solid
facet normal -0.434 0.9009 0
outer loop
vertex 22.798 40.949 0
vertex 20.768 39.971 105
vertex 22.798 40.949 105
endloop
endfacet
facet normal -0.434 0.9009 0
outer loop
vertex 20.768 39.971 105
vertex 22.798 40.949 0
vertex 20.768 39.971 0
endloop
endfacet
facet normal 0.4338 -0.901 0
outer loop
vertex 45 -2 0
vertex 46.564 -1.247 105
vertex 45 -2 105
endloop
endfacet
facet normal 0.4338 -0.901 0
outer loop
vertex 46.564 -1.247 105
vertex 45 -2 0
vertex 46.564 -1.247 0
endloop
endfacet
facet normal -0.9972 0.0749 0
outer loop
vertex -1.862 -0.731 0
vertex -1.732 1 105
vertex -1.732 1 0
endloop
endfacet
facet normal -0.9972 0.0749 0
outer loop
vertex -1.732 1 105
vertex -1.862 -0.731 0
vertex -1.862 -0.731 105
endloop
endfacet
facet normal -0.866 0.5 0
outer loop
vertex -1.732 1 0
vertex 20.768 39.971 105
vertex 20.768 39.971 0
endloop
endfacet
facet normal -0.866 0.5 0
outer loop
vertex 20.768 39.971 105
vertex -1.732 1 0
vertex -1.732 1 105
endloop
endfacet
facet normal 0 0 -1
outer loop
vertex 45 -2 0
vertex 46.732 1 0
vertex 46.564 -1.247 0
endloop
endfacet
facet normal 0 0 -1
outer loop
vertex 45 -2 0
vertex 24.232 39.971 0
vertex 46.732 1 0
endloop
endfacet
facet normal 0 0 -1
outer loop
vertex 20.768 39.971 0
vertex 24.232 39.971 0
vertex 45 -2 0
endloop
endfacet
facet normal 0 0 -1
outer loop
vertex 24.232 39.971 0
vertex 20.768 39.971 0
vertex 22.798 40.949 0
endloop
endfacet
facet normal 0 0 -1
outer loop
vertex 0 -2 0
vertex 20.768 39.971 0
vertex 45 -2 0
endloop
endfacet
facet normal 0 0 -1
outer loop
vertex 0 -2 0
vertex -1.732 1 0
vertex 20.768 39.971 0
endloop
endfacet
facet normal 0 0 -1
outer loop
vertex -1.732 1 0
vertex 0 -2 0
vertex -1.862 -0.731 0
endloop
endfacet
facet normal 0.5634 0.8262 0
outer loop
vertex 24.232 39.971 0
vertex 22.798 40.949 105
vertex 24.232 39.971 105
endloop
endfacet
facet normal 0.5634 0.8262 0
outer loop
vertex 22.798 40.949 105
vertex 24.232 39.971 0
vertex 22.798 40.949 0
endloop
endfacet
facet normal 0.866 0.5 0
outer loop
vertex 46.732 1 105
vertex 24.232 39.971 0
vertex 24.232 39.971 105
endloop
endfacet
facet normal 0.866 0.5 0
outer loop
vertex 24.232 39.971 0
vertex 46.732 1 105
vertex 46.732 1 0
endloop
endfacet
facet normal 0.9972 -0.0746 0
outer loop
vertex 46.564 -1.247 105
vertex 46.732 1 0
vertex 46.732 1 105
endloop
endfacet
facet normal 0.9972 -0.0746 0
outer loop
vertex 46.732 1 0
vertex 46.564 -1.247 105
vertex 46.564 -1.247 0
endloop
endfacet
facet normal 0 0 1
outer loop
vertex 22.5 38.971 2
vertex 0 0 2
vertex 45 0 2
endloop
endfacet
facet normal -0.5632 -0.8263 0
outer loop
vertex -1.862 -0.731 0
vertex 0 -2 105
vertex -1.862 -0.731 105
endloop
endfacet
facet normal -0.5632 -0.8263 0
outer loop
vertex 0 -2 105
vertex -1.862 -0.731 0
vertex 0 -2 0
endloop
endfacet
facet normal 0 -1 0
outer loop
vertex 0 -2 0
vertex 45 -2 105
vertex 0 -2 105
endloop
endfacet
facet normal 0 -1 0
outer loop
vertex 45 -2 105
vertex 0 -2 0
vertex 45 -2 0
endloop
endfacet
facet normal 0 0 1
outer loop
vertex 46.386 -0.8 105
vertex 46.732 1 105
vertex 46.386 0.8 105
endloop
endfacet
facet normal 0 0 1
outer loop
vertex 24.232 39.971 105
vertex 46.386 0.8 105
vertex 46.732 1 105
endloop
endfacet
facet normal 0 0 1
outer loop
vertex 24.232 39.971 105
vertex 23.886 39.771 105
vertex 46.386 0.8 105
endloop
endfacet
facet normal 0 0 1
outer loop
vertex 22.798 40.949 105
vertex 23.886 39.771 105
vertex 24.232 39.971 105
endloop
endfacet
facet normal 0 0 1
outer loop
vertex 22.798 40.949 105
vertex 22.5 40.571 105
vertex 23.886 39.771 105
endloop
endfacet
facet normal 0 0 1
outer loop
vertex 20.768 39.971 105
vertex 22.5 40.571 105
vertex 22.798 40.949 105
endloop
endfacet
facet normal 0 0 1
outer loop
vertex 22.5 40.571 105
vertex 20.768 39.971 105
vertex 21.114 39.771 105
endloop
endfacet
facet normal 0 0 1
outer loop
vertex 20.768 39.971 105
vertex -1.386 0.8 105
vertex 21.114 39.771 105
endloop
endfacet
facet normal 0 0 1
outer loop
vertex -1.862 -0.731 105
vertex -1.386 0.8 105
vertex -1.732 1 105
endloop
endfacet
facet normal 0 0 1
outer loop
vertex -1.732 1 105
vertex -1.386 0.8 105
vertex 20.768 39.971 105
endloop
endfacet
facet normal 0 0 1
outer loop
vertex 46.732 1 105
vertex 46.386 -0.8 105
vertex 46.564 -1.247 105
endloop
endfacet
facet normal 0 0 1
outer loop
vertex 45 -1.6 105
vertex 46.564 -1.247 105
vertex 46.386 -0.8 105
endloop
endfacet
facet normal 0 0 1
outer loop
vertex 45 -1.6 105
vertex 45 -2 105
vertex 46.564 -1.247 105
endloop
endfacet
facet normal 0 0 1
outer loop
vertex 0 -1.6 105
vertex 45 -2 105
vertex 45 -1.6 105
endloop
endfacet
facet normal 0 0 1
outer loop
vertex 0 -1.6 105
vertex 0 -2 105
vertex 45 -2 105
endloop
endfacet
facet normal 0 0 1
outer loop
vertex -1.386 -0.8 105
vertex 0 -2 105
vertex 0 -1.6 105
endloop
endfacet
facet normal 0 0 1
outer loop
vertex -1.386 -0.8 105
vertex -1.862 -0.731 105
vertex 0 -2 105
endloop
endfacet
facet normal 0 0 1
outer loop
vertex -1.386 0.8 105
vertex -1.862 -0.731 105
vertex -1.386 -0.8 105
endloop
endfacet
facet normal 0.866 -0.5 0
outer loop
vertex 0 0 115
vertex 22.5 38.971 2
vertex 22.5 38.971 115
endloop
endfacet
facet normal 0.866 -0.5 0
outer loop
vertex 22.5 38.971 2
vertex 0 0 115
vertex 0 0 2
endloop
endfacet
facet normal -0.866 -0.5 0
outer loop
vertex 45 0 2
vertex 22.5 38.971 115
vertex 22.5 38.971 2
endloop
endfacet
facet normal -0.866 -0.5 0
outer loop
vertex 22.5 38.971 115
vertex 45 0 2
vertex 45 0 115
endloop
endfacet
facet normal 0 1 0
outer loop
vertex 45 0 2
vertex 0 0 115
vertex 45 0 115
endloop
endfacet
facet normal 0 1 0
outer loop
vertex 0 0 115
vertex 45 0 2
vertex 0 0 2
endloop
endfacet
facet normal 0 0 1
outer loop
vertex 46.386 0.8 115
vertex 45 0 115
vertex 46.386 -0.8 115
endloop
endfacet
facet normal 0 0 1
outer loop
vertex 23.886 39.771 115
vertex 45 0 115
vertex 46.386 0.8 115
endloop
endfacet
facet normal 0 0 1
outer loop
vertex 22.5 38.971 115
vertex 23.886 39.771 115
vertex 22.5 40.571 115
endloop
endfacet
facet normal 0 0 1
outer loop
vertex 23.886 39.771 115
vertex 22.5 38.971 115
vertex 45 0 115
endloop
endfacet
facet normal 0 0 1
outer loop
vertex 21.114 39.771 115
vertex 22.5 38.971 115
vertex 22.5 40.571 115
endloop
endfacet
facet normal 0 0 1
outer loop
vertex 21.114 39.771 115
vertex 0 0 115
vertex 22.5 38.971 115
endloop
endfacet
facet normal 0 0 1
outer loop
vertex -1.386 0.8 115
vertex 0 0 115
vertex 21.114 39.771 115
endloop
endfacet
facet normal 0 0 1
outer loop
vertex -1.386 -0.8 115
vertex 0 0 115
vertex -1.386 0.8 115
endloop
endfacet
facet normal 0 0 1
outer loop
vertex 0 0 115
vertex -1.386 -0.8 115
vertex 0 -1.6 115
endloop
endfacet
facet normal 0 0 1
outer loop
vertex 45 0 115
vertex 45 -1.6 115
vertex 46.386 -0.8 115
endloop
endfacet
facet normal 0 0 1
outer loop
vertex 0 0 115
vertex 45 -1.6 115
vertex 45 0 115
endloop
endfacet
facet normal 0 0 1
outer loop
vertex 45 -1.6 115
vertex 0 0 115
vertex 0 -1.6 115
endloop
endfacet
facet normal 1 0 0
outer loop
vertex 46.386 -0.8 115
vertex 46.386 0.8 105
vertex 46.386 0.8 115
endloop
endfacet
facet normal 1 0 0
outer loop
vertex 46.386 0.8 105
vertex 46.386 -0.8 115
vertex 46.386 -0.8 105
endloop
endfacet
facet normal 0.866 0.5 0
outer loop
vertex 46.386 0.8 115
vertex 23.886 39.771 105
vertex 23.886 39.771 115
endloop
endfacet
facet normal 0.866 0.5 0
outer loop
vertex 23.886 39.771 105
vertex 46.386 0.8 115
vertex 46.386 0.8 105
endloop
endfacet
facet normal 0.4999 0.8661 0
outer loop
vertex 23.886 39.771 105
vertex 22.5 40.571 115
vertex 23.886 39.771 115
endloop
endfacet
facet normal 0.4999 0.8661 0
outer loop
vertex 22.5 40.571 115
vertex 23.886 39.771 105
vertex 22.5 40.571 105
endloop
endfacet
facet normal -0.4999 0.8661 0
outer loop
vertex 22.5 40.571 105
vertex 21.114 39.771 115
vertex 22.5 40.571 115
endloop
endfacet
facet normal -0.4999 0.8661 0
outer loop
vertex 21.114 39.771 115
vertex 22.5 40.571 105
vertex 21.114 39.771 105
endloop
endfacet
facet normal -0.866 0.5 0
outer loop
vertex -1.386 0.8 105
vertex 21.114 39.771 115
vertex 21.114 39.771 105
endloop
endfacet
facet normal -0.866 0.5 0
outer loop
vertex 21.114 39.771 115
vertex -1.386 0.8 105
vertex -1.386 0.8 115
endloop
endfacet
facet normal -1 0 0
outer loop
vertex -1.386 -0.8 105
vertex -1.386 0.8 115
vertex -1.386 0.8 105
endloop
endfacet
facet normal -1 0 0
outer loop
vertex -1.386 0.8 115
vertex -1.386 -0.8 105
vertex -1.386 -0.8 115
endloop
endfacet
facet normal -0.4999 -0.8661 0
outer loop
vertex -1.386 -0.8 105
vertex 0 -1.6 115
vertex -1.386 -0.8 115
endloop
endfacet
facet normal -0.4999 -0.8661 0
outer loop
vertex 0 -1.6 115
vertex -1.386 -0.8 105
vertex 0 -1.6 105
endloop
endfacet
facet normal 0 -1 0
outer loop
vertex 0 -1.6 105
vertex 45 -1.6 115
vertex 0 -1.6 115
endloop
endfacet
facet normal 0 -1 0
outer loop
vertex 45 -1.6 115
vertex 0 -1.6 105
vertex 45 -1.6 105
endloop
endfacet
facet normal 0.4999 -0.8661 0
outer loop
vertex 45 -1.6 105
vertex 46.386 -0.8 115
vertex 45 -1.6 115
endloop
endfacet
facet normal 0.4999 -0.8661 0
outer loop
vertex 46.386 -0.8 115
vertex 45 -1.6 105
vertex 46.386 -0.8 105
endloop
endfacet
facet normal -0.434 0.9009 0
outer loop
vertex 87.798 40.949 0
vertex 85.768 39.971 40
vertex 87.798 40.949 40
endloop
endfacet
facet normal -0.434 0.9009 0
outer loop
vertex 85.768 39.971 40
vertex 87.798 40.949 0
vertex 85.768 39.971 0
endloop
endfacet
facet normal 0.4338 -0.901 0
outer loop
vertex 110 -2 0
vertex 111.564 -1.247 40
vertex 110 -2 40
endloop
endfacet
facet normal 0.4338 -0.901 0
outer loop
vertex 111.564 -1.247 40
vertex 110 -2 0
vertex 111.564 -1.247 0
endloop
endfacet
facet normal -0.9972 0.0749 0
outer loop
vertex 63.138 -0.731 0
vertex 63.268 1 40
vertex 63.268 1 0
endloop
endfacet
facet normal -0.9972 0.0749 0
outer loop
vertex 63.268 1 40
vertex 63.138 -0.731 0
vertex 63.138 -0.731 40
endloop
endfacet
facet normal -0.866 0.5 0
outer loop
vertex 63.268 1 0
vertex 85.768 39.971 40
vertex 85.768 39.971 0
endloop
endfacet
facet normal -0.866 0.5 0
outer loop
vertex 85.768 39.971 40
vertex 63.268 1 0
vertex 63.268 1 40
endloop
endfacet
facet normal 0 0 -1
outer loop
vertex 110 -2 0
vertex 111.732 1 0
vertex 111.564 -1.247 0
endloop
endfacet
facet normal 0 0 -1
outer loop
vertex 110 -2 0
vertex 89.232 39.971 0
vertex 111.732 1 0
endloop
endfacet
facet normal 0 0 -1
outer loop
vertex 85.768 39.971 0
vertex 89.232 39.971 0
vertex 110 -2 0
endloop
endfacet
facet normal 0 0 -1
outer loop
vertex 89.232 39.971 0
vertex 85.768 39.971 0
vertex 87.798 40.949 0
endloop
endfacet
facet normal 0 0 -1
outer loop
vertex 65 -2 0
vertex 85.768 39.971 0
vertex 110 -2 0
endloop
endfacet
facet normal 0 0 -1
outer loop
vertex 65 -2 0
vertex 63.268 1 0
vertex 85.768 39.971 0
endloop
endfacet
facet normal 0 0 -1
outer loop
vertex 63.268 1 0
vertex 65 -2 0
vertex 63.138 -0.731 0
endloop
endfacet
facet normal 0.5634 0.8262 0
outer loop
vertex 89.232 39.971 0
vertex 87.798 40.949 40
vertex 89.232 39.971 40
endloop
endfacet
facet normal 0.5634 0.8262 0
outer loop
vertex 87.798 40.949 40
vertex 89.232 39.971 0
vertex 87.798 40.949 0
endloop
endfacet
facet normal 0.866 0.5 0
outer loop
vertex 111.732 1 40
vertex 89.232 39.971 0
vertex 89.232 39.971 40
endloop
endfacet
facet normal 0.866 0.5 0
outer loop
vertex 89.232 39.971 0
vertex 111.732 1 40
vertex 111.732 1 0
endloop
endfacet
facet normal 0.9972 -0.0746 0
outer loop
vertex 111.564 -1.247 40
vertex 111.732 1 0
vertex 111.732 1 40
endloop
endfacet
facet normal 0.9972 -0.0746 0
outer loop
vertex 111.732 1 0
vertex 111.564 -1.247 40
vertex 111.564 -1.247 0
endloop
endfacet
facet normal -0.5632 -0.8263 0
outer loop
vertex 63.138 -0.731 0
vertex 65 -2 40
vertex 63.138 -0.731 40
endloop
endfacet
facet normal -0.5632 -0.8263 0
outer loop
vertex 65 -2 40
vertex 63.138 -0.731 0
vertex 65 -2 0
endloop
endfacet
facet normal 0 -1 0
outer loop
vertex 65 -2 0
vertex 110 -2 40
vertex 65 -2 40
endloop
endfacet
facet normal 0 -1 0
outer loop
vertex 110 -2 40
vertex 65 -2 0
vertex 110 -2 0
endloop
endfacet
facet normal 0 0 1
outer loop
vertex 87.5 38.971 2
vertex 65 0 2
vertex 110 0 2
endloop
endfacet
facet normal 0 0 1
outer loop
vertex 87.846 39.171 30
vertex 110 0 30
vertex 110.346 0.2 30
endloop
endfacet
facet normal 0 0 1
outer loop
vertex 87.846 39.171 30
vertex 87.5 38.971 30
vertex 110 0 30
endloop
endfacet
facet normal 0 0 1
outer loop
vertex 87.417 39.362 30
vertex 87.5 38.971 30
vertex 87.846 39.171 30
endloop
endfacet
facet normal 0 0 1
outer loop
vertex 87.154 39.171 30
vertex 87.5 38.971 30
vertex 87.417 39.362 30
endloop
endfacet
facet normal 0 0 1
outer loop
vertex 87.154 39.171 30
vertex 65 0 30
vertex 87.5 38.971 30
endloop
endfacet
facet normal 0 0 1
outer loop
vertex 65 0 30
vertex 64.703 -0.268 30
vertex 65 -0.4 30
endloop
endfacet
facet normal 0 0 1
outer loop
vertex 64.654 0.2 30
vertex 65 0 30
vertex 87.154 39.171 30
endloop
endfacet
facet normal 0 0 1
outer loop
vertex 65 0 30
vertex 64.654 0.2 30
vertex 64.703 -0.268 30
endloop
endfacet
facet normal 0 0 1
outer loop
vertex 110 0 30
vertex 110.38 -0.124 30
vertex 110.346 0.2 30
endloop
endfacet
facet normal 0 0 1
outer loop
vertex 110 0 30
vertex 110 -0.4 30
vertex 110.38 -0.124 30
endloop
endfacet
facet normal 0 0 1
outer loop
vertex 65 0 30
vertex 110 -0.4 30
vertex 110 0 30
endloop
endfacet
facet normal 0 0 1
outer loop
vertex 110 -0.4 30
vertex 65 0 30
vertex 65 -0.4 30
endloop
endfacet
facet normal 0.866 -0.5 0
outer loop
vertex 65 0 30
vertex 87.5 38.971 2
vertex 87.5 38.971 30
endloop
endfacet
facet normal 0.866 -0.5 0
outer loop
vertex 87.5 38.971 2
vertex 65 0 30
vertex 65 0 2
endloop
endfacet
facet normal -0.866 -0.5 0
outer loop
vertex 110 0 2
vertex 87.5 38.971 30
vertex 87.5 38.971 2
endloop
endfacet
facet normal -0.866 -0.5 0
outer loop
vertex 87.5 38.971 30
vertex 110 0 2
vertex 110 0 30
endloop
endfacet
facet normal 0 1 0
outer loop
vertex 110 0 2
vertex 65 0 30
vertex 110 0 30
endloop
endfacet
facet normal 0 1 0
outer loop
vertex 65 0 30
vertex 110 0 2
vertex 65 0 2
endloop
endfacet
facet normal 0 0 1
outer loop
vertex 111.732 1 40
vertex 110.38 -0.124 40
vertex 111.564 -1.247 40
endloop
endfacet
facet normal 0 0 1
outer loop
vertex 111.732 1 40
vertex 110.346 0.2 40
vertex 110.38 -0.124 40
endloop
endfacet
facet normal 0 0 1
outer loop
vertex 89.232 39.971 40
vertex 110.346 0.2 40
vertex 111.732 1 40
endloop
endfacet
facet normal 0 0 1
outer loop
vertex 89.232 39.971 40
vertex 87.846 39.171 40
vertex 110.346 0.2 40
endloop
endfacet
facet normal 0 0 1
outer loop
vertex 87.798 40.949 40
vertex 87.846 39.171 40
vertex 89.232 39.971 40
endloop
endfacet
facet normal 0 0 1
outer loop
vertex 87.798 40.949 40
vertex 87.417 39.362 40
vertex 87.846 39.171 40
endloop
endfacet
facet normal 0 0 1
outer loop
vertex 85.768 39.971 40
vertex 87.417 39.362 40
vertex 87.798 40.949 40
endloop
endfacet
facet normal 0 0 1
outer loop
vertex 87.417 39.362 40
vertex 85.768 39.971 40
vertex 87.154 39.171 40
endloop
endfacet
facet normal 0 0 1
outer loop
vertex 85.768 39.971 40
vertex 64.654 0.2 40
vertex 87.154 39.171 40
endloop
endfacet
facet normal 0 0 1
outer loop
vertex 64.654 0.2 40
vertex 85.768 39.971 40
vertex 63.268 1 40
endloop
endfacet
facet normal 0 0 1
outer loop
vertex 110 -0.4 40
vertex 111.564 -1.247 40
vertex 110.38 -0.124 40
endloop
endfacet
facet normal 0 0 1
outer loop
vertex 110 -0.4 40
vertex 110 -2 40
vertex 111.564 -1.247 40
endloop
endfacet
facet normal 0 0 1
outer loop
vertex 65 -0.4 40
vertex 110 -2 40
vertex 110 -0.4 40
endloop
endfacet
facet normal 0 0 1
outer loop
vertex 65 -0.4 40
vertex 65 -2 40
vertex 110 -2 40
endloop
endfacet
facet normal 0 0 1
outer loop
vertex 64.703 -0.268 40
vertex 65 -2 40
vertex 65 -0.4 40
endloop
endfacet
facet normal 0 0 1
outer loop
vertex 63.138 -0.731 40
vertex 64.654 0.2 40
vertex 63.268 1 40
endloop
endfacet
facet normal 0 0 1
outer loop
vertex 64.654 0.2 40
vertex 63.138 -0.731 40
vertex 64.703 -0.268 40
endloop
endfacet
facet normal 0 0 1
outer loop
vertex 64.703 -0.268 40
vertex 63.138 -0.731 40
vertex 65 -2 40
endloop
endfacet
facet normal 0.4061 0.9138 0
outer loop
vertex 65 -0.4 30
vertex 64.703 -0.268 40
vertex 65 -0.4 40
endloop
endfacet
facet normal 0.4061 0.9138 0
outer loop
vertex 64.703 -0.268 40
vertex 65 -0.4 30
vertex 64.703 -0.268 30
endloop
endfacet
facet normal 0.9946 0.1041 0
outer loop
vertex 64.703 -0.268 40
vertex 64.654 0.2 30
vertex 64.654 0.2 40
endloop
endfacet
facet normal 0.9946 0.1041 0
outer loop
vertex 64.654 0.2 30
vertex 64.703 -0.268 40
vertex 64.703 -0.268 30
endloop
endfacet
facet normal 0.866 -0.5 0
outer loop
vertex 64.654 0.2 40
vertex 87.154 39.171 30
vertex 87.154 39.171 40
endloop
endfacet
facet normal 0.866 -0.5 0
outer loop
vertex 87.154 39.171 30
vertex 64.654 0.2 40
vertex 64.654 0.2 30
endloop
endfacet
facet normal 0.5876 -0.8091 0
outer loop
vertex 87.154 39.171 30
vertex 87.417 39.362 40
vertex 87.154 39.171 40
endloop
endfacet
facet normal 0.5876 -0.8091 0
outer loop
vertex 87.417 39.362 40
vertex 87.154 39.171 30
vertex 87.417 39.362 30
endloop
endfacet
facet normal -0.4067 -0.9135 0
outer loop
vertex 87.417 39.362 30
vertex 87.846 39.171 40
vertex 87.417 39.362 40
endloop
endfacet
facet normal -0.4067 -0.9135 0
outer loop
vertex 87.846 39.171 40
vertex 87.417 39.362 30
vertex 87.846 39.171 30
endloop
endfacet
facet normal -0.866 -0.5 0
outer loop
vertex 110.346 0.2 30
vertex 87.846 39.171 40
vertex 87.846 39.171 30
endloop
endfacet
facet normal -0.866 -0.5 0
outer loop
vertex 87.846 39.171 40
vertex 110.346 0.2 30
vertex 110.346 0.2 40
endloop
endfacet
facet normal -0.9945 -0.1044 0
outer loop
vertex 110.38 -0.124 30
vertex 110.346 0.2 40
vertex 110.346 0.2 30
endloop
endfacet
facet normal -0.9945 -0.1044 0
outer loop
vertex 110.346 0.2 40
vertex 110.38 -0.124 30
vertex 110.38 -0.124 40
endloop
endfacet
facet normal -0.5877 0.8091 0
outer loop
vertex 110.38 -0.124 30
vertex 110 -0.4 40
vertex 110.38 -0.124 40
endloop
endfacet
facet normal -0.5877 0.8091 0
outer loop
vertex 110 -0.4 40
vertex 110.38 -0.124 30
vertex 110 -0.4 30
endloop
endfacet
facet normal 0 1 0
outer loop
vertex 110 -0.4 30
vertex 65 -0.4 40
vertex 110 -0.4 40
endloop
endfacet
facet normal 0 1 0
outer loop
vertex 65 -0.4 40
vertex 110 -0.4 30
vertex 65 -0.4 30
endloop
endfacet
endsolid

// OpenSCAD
module triangle_container(width, height, wall_thickness=1.2) {
	linear_extrude(wall_thickness) {
			offset(wall_thickness) {
				polygon([[0,0], [width,0], [width/2,sin(60) * width]]);
			}
	}

	linear_extrude(height) {
		difference() {
			offset(wall_thickness) {
				polygon([[0,0], [width,0], [width/2,sin(60) * width]]);
			}
			polygon([[0,0], [width,0], [width/2,sin(60) * width]]);
			
		}
	}
}

module triangle_container_case(width, height, wall_thickness=1.2) {
	
	triangle_container(width, height, wall_thickness);
	translate([0,0,height]) {
		linear_extrude(10) {
			difference() {
				offset(wall_thickness-.4) {
					polygon([[0,0], [width,0], [width/2,sin(60) * width]]);
				}
				polygon([[0,0], [width,0], [width/2,sin(60) * width]]);
				
			}
		}
	}
}

module triangle_container_lid(width, height, wall_thickness=1.2) {

	triangle_container(width, height, wall_thickness);
	translate([0,0,height]) {
		linear_extrude(10) {
			difference() {
				offset(wall_thickness) {
					polygon([[0,0], [width,0], [width/2,sin(60) * width]]);
				}
				offset(.4)
				polygon([[0,0], [width,0], [width/2,sin(60) * width]]);
				
			}
		}
	}
}

width = 45;
// Case
triangle_container_case(width, 105, 2);

//Lid
translate([width + 20, 0, 0]) {
	triangle_container_lid(width, 30, 2);
}
